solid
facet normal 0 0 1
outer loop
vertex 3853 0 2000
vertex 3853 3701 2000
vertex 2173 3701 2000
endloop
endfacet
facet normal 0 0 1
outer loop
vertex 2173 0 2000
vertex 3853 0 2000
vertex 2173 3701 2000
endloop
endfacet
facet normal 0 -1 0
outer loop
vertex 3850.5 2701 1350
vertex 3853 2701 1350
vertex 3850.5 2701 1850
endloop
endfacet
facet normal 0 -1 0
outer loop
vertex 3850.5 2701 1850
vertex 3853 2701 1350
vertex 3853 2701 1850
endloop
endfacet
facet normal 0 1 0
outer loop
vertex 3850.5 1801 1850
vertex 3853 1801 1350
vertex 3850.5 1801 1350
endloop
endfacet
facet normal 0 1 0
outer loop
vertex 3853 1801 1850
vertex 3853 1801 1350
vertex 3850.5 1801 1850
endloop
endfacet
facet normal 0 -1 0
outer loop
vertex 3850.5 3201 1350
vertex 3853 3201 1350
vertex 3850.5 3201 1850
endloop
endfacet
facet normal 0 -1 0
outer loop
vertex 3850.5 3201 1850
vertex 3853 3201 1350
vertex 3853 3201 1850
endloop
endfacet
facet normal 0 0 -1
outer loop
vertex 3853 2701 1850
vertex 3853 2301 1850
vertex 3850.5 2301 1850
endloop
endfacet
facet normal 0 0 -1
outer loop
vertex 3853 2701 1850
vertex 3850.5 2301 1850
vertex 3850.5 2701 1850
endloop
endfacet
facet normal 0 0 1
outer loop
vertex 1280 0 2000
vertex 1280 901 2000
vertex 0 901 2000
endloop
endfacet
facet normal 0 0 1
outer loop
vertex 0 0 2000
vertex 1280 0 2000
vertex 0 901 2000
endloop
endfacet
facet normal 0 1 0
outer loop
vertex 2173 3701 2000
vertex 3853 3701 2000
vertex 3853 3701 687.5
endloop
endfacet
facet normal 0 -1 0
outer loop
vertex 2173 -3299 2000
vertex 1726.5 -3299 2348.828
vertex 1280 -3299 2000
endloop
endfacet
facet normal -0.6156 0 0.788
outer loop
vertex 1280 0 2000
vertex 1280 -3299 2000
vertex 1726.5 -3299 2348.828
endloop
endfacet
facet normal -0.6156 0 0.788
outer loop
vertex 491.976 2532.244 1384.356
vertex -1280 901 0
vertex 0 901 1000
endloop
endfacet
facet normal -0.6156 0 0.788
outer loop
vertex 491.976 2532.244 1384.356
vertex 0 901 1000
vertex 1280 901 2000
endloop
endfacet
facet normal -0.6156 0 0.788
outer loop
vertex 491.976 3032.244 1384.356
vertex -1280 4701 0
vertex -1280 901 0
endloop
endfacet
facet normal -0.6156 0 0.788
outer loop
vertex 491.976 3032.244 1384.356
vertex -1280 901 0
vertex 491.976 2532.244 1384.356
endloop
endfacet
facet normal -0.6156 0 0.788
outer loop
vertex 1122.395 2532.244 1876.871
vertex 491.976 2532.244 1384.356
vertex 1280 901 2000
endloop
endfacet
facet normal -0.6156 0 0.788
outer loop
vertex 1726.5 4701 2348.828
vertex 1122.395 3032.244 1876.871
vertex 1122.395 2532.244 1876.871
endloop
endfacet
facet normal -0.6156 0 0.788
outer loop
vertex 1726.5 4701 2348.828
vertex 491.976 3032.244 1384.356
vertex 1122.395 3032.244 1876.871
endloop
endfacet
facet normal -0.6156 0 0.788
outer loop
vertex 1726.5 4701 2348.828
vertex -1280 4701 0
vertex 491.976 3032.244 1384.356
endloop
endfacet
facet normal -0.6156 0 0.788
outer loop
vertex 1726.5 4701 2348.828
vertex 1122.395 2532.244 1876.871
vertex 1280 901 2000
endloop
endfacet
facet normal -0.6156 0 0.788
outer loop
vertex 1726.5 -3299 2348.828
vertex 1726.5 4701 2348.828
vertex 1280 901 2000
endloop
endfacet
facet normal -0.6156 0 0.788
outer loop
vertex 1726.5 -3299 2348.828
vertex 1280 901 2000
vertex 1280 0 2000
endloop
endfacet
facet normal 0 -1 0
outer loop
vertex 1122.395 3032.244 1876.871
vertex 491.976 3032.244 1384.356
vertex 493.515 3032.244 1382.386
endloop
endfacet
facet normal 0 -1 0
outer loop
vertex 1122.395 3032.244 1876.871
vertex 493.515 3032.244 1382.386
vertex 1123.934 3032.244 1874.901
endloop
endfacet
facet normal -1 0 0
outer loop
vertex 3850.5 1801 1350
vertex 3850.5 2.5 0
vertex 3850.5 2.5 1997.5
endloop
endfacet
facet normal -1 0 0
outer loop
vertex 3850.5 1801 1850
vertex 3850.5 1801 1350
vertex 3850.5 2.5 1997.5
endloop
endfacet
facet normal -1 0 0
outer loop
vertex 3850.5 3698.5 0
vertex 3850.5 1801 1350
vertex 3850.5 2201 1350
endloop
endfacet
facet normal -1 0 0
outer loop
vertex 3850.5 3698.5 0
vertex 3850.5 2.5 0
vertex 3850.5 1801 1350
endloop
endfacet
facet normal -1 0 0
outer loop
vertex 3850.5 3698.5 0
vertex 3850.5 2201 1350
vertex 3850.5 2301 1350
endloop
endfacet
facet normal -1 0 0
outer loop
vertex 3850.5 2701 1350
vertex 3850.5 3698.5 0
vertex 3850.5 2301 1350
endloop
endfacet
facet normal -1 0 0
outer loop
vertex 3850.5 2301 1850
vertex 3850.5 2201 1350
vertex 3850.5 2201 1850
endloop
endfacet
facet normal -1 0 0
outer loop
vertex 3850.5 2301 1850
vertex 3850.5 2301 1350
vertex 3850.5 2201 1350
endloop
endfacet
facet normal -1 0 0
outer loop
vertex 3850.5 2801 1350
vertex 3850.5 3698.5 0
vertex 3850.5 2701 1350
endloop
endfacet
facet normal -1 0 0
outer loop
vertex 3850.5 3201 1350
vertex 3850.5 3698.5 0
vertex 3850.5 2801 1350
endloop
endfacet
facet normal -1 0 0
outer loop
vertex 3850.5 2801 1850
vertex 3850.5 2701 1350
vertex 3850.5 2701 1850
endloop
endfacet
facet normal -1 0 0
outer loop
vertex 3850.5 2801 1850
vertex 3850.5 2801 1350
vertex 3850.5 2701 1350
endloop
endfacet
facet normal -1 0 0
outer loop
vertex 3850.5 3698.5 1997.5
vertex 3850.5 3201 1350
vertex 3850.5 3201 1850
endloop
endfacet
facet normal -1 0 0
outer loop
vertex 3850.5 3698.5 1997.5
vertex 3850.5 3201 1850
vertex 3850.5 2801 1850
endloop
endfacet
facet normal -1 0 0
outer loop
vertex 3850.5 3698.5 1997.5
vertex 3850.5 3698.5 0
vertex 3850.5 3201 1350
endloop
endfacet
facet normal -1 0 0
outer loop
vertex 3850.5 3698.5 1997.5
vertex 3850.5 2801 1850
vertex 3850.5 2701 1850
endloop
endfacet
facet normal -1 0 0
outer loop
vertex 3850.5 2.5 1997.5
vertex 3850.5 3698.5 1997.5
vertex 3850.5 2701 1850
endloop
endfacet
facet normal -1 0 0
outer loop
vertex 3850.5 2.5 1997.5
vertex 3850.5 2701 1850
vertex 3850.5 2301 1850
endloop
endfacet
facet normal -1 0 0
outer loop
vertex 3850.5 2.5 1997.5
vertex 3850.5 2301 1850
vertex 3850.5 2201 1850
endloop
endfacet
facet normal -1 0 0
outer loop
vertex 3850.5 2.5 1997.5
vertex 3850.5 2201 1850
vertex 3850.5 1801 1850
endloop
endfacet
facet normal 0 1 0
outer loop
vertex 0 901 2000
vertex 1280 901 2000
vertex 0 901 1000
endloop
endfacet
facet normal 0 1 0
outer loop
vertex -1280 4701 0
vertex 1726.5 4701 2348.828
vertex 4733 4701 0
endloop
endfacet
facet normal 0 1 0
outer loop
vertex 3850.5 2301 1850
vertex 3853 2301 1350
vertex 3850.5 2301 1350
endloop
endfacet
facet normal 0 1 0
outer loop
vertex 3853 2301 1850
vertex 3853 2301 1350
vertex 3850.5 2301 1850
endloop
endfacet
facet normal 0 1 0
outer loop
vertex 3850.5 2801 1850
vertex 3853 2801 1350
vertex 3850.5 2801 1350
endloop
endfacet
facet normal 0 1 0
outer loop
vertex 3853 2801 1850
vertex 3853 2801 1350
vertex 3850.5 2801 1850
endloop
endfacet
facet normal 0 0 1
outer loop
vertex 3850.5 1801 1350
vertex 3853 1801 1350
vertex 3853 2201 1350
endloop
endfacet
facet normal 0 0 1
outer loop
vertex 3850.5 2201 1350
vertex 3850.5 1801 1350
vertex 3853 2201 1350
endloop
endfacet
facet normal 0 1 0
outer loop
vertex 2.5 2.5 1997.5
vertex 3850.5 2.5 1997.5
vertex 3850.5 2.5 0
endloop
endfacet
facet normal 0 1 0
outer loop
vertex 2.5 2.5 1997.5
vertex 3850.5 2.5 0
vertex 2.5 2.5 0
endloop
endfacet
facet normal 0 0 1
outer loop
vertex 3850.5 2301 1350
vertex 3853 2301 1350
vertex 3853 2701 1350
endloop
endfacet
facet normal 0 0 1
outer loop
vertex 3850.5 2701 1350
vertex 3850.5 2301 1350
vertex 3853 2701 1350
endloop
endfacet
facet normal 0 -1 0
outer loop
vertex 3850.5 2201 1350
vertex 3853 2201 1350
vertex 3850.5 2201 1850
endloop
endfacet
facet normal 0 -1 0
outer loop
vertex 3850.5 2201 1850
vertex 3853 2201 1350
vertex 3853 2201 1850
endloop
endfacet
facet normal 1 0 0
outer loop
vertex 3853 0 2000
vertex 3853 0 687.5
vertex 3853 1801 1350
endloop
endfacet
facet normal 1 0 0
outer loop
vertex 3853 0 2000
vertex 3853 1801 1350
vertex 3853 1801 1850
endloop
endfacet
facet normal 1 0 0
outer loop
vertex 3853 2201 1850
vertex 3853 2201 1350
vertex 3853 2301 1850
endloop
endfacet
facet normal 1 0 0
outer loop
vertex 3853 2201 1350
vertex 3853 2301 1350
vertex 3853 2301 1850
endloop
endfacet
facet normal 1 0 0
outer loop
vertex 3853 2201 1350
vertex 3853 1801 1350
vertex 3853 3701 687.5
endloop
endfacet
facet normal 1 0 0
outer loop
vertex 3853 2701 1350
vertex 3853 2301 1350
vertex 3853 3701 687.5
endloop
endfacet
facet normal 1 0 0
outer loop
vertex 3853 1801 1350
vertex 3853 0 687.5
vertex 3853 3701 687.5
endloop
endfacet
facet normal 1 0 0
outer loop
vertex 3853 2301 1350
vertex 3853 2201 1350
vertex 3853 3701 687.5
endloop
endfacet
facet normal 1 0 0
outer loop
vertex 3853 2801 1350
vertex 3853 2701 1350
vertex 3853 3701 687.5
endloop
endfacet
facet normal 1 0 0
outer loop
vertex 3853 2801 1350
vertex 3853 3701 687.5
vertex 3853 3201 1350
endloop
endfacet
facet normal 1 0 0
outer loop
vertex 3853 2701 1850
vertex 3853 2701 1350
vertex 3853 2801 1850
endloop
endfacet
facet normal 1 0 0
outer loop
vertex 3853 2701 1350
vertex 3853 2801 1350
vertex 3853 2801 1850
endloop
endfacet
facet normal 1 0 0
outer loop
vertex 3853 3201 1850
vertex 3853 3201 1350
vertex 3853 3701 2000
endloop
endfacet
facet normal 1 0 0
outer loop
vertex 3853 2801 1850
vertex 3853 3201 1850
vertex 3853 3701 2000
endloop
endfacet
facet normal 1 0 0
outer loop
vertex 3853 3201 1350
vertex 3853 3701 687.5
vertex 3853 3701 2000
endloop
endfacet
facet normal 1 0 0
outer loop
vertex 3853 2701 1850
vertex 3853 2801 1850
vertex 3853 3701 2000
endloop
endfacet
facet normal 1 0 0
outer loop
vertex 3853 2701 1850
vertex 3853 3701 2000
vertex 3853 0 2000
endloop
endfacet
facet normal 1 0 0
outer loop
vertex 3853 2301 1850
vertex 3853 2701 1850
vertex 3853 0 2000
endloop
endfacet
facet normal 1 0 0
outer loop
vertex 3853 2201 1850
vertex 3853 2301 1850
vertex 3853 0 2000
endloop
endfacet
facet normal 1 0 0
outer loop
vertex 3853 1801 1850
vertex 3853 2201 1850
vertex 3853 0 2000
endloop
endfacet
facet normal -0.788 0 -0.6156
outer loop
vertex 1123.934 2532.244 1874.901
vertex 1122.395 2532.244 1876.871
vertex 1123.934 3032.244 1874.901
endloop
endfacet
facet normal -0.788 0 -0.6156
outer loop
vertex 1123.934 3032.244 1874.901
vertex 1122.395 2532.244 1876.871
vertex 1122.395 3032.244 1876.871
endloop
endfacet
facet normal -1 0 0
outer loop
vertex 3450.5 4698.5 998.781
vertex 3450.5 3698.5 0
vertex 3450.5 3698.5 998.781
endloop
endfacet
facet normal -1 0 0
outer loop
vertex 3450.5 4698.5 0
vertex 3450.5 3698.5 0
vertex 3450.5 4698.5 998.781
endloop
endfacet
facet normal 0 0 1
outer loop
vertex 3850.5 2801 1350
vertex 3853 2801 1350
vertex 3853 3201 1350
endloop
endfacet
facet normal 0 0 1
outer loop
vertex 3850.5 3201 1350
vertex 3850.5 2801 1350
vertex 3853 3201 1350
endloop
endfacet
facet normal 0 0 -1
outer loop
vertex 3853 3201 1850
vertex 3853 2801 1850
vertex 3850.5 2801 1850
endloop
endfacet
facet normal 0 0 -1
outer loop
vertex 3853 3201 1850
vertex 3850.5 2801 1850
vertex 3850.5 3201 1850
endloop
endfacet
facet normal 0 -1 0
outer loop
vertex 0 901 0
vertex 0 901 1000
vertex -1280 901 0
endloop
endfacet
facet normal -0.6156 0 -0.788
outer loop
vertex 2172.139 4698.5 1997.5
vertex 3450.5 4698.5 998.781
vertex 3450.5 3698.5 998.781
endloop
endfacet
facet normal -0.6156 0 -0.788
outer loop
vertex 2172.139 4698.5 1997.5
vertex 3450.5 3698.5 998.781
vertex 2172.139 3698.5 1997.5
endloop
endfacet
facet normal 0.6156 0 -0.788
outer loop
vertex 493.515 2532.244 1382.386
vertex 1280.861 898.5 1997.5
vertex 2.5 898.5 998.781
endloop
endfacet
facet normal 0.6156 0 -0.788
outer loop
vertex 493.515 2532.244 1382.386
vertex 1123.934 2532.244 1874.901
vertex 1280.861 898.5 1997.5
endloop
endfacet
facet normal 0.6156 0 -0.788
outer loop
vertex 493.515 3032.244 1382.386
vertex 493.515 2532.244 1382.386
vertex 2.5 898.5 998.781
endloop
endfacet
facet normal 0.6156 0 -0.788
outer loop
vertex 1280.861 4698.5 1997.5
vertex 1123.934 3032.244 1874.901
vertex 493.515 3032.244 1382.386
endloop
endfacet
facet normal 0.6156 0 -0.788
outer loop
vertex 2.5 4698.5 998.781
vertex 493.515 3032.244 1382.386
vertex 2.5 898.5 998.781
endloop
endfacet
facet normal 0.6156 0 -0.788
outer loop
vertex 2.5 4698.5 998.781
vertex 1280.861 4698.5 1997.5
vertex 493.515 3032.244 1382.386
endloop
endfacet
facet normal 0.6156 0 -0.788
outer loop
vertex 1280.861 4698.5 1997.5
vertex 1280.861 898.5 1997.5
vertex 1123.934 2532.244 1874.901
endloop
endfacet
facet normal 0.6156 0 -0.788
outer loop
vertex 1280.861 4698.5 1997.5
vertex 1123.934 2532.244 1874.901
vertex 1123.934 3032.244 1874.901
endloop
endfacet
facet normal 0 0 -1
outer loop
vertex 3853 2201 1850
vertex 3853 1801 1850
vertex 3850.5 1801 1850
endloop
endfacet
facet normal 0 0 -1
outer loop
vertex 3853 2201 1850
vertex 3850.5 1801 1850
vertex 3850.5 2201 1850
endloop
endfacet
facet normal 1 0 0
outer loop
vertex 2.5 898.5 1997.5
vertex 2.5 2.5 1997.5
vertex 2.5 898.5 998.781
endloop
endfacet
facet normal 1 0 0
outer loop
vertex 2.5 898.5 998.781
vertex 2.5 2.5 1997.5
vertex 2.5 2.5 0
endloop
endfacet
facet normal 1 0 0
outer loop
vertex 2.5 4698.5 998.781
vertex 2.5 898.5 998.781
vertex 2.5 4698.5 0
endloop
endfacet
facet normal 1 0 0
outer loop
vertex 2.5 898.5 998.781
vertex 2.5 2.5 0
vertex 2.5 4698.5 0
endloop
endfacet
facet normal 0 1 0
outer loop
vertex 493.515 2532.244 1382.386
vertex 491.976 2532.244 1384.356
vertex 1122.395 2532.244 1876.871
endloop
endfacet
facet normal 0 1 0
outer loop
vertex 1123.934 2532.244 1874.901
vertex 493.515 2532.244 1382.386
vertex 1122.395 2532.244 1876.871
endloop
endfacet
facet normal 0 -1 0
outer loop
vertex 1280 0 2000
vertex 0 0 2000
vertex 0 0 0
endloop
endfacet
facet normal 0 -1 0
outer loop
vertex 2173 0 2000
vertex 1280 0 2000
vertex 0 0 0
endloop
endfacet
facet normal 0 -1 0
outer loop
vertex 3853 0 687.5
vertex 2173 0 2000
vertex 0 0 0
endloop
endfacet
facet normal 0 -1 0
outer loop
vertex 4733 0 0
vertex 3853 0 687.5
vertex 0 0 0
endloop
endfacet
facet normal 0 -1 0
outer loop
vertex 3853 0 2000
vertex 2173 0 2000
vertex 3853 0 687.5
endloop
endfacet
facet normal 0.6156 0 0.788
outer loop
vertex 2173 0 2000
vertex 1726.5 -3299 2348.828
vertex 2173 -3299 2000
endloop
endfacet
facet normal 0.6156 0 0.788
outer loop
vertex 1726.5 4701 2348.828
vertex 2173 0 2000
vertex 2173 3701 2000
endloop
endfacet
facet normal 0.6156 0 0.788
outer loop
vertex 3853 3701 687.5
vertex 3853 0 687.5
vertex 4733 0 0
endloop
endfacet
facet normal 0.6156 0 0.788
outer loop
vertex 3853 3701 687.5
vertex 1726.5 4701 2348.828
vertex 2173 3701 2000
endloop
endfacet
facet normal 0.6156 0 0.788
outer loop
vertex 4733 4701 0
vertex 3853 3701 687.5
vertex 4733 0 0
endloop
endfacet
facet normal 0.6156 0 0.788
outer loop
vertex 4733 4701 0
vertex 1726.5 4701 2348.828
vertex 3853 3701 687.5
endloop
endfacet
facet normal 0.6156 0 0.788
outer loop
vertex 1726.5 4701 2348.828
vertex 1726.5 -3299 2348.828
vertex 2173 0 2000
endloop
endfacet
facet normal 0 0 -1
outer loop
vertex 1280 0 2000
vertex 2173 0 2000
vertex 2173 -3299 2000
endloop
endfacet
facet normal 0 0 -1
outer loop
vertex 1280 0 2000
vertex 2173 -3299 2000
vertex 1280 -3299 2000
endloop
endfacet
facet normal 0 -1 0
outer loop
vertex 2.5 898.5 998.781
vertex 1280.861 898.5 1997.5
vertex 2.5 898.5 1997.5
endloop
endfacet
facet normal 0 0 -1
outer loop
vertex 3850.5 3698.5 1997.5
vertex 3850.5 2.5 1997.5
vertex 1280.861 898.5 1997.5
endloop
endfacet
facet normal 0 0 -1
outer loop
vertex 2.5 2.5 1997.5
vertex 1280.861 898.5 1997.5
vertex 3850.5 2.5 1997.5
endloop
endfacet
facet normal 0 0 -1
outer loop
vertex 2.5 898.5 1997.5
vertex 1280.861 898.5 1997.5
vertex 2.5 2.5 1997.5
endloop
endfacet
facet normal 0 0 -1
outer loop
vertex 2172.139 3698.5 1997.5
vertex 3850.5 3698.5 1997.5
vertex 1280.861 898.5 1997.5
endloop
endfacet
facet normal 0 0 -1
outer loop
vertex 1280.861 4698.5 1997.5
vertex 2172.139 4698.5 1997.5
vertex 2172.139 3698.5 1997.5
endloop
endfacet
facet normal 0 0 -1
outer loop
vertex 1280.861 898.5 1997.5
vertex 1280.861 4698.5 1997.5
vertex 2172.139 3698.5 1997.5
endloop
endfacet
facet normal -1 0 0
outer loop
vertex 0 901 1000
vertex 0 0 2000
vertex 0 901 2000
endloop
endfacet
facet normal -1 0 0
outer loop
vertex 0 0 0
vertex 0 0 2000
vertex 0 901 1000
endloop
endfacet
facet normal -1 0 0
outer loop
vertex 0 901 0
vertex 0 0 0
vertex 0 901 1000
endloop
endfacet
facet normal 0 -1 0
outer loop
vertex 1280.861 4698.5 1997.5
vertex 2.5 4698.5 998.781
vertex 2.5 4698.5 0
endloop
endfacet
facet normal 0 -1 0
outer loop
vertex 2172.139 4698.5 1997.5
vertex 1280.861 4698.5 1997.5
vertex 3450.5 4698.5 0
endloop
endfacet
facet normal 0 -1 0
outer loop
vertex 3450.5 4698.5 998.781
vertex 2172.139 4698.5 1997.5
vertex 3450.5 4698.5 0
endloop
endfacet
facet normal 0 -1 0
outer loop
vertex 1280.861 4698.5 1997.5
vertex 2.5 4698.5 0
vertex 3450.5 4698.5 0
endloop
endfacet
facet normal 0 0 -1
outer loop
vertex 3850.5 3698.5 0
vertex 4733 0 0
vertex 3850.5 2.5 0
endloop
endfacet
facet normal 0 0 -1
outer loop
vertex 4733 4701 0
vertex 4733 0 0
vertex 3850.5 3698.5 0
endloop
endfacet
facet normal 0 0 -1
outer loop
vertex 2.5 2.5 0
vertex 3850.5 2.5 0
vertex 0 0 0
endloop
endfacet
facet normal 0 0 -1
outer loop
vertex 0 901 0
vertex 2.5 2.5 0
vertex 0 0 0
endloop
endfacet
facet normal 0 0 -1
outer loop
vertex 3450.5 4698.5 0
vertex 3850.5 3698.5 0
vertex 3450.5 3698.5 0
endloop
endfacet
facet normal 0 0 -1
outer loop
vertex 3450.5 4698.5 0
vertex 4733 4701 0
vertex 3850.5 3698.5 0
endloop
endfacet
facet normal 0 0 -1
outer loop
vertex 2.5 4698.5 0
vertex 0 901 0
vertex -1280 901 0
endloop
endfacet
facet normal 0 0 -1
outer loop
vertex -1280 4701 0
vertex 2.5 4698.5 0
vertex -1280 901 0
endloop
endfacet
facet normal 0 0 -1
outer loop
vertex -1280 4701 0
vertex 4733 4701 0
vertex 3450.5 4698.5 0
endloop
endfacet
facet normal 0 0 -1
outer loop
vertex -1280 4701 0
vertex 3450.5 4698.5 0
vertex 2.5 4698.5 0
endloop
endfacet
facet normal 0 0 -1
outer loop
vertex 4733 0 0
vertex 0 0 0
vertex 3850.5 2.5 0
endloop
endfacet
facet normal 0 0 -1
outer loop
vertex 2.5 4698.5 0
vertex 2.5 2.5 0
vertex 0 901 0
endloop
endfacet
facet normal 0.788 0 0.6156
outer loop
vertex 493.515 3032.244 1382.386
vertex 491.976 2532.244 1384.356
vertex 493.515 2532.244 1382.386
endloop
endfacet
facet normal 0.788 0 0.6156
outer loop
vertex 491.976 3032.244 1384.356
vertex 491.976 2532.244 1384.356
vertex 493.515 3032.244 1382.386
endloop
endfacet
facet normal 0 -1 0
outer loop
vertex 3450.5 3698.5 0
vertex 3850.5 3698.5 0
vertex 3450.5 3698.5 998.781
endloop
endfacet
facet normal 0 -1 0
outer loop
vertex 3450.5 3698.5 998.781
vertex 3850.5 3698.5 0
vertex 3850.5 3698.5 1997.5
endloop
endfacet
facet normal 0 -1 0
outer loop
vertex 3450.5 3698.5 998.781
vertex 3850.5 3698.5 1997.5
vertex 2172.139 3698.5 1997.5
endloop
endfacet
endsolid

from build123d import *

# Parameters (mm, degrees)
F0_W      = 3453
F0_H      = 4701
F1_DEPTH  = 2000
F3_DEPTH  = 1000
F5_DEPTH  = 3800
F6_W      = 400
F6_H      = 2000
F7_DEPTH  = 3701
F8_T      = -2.5
F9_W      = 400
F9_H      = 500
F10_DEPTH = 2.5
F11_W     = 800
F11_H     = 500
F12_DEPTH = 2.5
F14_DEPTH = 1000
F16_DEPTH = 3701
F18_DEPTH = 3800
F20_DEPTH = 8000


with BuildPart() as f1:
    # F0 (on Top) → F1 (new body)
    with BuildSketch(Plane.XY):
        with Locations((1726.5, 2350.5)):
            Rectangle(F0_W, F0_H)
    extrude(amount=F1_DEPTH)

    # F2 (on face) → F3 (cut)
    with BuildSketch(Plane(origin=(0, 4701, 0), x_dir=(-1, 0, 0), z_dir=(0, 1, 0))):
        Polygon((-3453, 2000), (-3453, 1000), (-2173, 2000), align=None)
    extrude(amount=-F3_DEPTH, mode=Mode.SUBTRACT)

    # F4 (on face) → F5 (cut)
    with BuildSketch(Plane(origin=(0, 4701, 0), x_dir=(-1, 0, 0), z_dir=(0, 1, 0))):
        Polygon((-1280, 2000), (0, 1000), (0, 2000), align=None)
    extrude(amount=-F5_DEPTH, mode=Mode.SUBTRACT)

    # F6 (on face) → F7 (join, through all)
    with BuildSketch(Plane(origin=(0, 3701, 0), x_dir=(-1, 0, 0), z_dir=(0, 1, 0))):
        with Locations((-3653, 1000)):
            Rectangle(F6_W, F6_H)
    extrude(amount=-F7_DEPTH)

    # F8
    f8_openings = [f1.faces().sort_by_distance(p)[0] for p in [
        (1887.511583, 2308.711372, 0),
    ]]
    offset(amount=F8_T, openings=f8_openings, kind=Kind.INTERSECTION)

    # F9 (on face) → F10 (cut, through all)
    with BuildSketch(Plane.YZ.offset(3853)):
        with Locations((3001, 1600)):
            Rectangle(F9_W, F9_H)
        with Locations((2501, 1600)):
            Rectangle(F9_W, F9_H)
        with Locations((2001, 1600)):
            Rectangle(F9_W, F9_H)
    extrude(amount=-F10_DEPTH, mode=Mode.SUBTRACT)

    # F11 (on face) → F12 (cut, through all)
    with BuildSketch(Plane(origin=(-485.1425106125, 0, 620.982413584), x_dir=(0.7880243737, 0, 0.615644042), z_dir=(-0.615644042, 0, 0.7880243737))):
        with Locations((1639.9592823121, 2782.2438387594)):
            Rectangle(F11_W, F11_H)
    extrude(amount=-F12_DEPTH, mode=Mode.SUBTRACT)

    # F13 (on face) → F14 (join, through all)
    with BuildSketch(Plane(origin=(0, 3701, 0), x_dir=(-1, 0, 0), z_dir=(0, 1, 0))):
        Polygon((-3453, 0), (-3453, 1000), (-4733, 0), align=None)
    extrude(amount=F14_DEPTH)

    # F15 (on face) → F16 (join, through all)
    with BuildSketch(Plane.XZ.offset(-3701)):
        Polygon((4733, 0), (3853, 687.5), (3853, 0), align=None)
    extrude(amount=F16_DEPTH)

    # F17 (on face) → F18 (join, through all)
    with BuildSketch(Plane(origin=(0, 4701, 0), x_dir=(-1, 0, 0), z_dir=(0, 1, 0))):
        Polygon((1280, 0), (0, 1000), (0, 0), align=None)
    extrude(amount=-F18_DEPTH)

    # F19 (on face) → F20 (join)
    with BuildSketch(Plane(origin=(0, 4701, 0), x_dir=(-1, 0, 0), z_dir=(0, 1, 0))):
        Polygon((-2173, 2000), (-1280, 2000), (-1726.5, 2348.828125), align=None)
    extrude(amount=-F20_DEPTH)


solid = f1.part
